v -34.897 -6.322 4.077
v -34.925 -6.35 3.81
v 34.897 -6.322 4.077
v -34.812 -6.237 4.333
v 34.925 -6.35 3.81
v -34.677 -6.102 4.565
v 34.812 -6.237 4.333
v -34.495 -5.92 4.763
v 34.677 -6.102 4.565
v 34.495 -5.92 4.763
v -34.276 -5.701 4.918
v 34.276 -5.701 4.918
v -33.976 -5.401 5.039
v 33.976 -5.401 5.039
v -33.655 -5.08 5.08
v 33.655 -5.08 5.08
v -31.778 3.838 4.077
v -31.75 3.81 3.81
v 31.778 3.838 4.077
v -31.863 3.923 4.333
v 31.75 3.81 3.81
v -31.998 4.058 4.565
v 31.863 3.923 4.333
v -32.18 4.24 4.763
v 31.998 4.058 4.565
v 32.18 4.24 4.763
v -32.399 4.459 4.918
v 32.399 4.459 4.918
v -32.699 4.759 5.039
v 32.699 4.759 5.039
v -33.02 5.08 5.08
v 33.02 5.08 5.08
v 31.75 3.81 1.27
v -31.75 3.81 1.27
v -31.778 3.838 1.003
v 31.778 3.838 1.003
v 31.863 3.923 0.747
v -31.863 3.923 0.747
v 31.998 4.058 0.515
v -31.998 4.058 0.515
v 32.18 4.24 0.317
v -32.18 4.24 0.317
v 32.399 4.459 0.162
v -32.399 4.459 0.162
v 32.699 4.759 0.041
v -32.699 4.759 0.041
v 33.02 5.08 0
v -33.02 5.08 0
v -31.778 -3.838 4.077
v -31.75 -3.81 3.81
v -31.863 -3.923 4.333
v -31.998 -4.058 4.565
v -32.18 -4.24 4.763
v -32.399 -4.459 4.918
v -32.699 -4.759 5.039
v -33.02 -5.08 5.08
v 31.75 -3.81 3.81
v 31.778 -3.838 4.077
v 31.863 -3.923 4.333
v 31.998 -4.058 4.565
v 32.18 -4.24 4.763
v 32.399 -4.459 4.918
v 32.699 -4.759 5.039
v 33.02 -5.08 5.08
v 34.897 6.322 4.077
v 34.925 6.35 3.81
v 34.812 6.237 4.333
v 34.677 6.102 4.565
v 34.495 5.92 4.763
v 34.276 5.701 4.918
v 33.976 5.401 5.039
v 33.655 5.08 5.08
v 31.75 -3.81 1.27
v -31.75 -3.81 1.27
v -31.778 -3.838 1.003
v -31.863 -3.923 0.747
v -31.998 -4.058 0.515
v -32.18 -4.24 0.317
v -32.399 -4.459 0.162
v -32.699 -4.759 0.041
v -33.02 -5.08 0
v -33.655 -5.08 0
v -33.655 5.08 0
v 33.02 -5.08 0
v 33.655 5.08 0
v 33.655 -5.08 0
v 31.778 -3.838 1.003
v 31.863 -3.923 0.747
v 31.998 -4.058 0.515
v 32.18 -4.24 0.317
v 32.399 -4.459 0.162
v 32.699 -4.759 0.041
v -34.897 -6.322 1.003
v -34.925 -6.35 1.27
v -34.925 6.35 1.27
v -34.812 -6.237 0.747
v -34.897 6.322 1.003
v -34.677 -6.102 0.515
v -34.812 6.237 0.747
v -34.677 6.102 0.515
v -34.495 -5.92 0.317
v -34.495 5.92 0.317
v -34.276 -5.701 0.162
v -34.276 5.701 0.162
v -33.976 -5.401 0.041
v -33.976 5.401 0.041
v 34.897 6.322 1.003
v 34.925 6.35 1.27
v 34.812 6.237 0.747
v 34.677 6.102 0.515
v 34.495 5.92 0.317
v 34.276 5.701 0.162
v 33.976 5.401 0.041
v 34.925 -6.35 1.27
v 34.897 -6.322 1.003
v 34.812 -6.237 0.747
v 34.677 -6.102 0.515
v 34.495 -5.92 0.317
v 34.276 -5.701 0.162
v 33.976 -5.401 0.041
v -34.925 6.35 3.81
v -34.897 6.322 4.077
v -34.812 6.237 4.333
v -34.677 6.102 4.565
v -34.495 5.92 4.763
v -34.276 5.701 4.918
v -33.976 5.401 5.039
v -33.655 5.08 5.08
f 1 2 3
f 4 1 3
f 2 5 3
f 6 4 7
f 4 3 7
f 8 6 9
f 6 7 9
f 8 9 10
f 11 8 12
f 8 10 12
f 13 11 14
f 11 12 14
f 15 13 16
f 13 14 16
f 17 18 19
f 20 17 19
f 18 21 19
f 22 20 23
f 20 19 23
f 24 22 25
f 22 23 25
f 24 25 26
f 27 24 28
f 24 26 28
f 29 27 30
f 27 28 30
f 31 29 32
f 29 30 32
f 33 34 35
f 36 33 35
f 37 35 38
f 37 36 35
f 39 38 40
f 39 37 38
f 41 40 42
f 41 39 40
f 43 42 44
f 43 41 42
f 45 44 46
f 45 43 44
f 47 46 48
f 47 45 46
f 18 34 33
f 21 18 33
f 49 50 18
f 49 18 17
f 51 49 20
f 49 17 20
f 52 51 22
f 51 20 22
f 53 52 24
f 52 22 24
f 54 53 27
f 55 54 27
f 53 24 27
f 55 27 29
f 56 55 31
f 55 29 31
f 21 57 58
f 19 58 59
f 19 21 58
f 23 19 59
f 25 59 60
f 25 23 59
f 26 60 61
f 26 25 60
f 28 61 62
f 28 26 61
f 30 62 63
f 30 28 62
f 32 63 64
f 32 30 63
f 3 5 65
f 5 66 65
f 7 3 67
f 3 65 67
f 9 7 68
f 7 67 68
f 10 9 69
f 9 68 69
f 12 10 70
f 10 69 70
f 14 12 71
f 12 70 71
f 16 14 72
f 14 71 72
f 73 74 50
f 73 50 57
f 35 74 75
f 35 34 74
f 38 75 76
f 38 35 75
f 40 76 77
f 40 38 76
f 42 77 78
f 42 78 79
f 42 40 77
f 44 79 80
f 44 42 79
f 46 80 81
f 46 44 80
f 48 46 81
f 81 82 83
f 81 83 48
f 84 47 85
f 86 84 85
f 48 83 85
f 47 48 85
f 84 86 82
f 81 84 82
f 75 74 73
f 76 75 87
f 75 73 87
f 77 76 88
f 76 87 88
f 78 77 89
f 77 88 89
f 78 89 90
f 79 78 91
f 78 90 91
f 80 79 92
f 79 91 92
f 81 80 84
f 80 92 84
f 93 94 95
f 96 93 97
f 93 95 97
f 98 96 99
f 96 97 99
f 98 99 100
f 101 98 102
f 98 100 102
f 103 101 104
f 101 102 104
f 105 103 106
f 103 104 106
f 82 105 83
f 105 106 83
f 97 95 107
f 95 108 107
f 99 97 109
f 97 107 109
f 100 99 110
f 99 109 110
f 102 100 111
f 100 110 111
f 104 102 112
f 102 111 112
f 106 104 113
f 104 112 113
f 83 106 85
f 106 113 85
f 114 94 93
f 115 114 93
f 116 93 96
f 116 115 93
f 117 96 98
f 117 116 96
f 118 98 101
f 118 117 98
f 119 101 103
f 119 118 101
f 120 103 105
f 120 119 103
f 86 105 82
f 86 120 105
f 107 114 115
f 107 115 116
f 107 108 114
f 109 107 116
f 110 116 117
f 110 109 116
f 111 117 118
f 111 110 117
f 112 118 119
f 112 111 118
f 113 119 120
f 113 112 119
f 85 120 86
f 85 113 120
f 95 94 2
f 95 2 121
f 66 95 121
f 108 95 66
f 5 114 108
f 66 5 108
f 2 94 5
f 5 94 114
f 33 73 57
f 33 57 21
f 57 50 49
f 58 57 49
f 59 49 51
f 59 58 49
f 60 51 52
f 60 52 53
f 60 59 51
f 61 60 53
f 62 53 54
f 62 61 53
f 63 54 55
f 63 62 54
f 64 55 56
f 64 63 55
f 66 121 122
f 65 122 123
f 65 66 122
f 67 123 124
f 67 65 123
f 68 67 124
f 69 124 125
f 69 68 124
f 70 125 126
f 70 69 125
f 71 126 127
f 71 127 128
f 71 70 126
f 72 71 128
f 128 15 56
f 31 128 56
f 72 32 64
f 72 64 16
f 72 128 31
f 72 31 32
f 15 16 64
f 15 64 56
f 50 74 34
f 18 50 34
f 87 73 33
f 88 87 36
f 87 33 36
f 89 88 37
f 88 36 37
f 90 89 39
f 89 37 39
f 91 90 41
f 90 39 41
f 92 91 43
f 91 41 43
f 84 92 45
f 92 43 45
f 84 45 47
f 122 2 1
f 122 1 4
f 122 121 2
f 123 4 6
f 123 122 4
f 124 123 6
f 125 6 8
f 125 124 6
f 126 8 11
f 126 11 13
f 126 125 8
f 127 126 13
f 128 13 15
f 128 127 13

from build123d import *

# Parameters (mm, degrees)
F0_W     = 69.85
F0_H     = 12.7
F0_W_2   = 63.5
F0_H_2   = 7.62
F1_DEPTH = 5.08
F2_R     = 1.26999


# Not quite as in the source:
# - a fillet or chamfer is up to 0.001 mm smaller than in the source, because OpenCascade refuses the exact size


with BuildPart() as f1:
    # F0 (on Top) → F1 (new body)
    with BuildSketch(Plane.XY):
        Rectangle(F0_W, F0_H)
        Rectangle(F0_W_2, F0_H_2, mode=Mode.SUBTRACT)
    extrude(amount=F1_DEPTH)

    # F2 (radius 1.27 in the source; OpenCascade refuses exactly that, so slightly less here)
    f2_edges = [f1.edges().sort_by_distance(p)[0] for p in [
        (0, 6.35, 5.08),
        (-34.925, 0, 5.08),
        (0, -6.35, 5.08),
        (34.925, 0, 5.08),
        (-31.75, 0, 5.08),
        (0, 3.81, 5.08),
        (31.75, 0, 5.08),
        (0, -3.81, 5.08),
        (0, 6.35, 0),
        (-34.925, 0, 0),
        (0, -6.35, 0),
        (34.925, 0, 0),
        (-31.75, 0, 0),
        (0, 3.81, 0),
        (31.75, 0, 0),
        (0, -3.81, 0),
    ]]
    fillet(f2_edges, radius=F2_R)


solid = f1.part
